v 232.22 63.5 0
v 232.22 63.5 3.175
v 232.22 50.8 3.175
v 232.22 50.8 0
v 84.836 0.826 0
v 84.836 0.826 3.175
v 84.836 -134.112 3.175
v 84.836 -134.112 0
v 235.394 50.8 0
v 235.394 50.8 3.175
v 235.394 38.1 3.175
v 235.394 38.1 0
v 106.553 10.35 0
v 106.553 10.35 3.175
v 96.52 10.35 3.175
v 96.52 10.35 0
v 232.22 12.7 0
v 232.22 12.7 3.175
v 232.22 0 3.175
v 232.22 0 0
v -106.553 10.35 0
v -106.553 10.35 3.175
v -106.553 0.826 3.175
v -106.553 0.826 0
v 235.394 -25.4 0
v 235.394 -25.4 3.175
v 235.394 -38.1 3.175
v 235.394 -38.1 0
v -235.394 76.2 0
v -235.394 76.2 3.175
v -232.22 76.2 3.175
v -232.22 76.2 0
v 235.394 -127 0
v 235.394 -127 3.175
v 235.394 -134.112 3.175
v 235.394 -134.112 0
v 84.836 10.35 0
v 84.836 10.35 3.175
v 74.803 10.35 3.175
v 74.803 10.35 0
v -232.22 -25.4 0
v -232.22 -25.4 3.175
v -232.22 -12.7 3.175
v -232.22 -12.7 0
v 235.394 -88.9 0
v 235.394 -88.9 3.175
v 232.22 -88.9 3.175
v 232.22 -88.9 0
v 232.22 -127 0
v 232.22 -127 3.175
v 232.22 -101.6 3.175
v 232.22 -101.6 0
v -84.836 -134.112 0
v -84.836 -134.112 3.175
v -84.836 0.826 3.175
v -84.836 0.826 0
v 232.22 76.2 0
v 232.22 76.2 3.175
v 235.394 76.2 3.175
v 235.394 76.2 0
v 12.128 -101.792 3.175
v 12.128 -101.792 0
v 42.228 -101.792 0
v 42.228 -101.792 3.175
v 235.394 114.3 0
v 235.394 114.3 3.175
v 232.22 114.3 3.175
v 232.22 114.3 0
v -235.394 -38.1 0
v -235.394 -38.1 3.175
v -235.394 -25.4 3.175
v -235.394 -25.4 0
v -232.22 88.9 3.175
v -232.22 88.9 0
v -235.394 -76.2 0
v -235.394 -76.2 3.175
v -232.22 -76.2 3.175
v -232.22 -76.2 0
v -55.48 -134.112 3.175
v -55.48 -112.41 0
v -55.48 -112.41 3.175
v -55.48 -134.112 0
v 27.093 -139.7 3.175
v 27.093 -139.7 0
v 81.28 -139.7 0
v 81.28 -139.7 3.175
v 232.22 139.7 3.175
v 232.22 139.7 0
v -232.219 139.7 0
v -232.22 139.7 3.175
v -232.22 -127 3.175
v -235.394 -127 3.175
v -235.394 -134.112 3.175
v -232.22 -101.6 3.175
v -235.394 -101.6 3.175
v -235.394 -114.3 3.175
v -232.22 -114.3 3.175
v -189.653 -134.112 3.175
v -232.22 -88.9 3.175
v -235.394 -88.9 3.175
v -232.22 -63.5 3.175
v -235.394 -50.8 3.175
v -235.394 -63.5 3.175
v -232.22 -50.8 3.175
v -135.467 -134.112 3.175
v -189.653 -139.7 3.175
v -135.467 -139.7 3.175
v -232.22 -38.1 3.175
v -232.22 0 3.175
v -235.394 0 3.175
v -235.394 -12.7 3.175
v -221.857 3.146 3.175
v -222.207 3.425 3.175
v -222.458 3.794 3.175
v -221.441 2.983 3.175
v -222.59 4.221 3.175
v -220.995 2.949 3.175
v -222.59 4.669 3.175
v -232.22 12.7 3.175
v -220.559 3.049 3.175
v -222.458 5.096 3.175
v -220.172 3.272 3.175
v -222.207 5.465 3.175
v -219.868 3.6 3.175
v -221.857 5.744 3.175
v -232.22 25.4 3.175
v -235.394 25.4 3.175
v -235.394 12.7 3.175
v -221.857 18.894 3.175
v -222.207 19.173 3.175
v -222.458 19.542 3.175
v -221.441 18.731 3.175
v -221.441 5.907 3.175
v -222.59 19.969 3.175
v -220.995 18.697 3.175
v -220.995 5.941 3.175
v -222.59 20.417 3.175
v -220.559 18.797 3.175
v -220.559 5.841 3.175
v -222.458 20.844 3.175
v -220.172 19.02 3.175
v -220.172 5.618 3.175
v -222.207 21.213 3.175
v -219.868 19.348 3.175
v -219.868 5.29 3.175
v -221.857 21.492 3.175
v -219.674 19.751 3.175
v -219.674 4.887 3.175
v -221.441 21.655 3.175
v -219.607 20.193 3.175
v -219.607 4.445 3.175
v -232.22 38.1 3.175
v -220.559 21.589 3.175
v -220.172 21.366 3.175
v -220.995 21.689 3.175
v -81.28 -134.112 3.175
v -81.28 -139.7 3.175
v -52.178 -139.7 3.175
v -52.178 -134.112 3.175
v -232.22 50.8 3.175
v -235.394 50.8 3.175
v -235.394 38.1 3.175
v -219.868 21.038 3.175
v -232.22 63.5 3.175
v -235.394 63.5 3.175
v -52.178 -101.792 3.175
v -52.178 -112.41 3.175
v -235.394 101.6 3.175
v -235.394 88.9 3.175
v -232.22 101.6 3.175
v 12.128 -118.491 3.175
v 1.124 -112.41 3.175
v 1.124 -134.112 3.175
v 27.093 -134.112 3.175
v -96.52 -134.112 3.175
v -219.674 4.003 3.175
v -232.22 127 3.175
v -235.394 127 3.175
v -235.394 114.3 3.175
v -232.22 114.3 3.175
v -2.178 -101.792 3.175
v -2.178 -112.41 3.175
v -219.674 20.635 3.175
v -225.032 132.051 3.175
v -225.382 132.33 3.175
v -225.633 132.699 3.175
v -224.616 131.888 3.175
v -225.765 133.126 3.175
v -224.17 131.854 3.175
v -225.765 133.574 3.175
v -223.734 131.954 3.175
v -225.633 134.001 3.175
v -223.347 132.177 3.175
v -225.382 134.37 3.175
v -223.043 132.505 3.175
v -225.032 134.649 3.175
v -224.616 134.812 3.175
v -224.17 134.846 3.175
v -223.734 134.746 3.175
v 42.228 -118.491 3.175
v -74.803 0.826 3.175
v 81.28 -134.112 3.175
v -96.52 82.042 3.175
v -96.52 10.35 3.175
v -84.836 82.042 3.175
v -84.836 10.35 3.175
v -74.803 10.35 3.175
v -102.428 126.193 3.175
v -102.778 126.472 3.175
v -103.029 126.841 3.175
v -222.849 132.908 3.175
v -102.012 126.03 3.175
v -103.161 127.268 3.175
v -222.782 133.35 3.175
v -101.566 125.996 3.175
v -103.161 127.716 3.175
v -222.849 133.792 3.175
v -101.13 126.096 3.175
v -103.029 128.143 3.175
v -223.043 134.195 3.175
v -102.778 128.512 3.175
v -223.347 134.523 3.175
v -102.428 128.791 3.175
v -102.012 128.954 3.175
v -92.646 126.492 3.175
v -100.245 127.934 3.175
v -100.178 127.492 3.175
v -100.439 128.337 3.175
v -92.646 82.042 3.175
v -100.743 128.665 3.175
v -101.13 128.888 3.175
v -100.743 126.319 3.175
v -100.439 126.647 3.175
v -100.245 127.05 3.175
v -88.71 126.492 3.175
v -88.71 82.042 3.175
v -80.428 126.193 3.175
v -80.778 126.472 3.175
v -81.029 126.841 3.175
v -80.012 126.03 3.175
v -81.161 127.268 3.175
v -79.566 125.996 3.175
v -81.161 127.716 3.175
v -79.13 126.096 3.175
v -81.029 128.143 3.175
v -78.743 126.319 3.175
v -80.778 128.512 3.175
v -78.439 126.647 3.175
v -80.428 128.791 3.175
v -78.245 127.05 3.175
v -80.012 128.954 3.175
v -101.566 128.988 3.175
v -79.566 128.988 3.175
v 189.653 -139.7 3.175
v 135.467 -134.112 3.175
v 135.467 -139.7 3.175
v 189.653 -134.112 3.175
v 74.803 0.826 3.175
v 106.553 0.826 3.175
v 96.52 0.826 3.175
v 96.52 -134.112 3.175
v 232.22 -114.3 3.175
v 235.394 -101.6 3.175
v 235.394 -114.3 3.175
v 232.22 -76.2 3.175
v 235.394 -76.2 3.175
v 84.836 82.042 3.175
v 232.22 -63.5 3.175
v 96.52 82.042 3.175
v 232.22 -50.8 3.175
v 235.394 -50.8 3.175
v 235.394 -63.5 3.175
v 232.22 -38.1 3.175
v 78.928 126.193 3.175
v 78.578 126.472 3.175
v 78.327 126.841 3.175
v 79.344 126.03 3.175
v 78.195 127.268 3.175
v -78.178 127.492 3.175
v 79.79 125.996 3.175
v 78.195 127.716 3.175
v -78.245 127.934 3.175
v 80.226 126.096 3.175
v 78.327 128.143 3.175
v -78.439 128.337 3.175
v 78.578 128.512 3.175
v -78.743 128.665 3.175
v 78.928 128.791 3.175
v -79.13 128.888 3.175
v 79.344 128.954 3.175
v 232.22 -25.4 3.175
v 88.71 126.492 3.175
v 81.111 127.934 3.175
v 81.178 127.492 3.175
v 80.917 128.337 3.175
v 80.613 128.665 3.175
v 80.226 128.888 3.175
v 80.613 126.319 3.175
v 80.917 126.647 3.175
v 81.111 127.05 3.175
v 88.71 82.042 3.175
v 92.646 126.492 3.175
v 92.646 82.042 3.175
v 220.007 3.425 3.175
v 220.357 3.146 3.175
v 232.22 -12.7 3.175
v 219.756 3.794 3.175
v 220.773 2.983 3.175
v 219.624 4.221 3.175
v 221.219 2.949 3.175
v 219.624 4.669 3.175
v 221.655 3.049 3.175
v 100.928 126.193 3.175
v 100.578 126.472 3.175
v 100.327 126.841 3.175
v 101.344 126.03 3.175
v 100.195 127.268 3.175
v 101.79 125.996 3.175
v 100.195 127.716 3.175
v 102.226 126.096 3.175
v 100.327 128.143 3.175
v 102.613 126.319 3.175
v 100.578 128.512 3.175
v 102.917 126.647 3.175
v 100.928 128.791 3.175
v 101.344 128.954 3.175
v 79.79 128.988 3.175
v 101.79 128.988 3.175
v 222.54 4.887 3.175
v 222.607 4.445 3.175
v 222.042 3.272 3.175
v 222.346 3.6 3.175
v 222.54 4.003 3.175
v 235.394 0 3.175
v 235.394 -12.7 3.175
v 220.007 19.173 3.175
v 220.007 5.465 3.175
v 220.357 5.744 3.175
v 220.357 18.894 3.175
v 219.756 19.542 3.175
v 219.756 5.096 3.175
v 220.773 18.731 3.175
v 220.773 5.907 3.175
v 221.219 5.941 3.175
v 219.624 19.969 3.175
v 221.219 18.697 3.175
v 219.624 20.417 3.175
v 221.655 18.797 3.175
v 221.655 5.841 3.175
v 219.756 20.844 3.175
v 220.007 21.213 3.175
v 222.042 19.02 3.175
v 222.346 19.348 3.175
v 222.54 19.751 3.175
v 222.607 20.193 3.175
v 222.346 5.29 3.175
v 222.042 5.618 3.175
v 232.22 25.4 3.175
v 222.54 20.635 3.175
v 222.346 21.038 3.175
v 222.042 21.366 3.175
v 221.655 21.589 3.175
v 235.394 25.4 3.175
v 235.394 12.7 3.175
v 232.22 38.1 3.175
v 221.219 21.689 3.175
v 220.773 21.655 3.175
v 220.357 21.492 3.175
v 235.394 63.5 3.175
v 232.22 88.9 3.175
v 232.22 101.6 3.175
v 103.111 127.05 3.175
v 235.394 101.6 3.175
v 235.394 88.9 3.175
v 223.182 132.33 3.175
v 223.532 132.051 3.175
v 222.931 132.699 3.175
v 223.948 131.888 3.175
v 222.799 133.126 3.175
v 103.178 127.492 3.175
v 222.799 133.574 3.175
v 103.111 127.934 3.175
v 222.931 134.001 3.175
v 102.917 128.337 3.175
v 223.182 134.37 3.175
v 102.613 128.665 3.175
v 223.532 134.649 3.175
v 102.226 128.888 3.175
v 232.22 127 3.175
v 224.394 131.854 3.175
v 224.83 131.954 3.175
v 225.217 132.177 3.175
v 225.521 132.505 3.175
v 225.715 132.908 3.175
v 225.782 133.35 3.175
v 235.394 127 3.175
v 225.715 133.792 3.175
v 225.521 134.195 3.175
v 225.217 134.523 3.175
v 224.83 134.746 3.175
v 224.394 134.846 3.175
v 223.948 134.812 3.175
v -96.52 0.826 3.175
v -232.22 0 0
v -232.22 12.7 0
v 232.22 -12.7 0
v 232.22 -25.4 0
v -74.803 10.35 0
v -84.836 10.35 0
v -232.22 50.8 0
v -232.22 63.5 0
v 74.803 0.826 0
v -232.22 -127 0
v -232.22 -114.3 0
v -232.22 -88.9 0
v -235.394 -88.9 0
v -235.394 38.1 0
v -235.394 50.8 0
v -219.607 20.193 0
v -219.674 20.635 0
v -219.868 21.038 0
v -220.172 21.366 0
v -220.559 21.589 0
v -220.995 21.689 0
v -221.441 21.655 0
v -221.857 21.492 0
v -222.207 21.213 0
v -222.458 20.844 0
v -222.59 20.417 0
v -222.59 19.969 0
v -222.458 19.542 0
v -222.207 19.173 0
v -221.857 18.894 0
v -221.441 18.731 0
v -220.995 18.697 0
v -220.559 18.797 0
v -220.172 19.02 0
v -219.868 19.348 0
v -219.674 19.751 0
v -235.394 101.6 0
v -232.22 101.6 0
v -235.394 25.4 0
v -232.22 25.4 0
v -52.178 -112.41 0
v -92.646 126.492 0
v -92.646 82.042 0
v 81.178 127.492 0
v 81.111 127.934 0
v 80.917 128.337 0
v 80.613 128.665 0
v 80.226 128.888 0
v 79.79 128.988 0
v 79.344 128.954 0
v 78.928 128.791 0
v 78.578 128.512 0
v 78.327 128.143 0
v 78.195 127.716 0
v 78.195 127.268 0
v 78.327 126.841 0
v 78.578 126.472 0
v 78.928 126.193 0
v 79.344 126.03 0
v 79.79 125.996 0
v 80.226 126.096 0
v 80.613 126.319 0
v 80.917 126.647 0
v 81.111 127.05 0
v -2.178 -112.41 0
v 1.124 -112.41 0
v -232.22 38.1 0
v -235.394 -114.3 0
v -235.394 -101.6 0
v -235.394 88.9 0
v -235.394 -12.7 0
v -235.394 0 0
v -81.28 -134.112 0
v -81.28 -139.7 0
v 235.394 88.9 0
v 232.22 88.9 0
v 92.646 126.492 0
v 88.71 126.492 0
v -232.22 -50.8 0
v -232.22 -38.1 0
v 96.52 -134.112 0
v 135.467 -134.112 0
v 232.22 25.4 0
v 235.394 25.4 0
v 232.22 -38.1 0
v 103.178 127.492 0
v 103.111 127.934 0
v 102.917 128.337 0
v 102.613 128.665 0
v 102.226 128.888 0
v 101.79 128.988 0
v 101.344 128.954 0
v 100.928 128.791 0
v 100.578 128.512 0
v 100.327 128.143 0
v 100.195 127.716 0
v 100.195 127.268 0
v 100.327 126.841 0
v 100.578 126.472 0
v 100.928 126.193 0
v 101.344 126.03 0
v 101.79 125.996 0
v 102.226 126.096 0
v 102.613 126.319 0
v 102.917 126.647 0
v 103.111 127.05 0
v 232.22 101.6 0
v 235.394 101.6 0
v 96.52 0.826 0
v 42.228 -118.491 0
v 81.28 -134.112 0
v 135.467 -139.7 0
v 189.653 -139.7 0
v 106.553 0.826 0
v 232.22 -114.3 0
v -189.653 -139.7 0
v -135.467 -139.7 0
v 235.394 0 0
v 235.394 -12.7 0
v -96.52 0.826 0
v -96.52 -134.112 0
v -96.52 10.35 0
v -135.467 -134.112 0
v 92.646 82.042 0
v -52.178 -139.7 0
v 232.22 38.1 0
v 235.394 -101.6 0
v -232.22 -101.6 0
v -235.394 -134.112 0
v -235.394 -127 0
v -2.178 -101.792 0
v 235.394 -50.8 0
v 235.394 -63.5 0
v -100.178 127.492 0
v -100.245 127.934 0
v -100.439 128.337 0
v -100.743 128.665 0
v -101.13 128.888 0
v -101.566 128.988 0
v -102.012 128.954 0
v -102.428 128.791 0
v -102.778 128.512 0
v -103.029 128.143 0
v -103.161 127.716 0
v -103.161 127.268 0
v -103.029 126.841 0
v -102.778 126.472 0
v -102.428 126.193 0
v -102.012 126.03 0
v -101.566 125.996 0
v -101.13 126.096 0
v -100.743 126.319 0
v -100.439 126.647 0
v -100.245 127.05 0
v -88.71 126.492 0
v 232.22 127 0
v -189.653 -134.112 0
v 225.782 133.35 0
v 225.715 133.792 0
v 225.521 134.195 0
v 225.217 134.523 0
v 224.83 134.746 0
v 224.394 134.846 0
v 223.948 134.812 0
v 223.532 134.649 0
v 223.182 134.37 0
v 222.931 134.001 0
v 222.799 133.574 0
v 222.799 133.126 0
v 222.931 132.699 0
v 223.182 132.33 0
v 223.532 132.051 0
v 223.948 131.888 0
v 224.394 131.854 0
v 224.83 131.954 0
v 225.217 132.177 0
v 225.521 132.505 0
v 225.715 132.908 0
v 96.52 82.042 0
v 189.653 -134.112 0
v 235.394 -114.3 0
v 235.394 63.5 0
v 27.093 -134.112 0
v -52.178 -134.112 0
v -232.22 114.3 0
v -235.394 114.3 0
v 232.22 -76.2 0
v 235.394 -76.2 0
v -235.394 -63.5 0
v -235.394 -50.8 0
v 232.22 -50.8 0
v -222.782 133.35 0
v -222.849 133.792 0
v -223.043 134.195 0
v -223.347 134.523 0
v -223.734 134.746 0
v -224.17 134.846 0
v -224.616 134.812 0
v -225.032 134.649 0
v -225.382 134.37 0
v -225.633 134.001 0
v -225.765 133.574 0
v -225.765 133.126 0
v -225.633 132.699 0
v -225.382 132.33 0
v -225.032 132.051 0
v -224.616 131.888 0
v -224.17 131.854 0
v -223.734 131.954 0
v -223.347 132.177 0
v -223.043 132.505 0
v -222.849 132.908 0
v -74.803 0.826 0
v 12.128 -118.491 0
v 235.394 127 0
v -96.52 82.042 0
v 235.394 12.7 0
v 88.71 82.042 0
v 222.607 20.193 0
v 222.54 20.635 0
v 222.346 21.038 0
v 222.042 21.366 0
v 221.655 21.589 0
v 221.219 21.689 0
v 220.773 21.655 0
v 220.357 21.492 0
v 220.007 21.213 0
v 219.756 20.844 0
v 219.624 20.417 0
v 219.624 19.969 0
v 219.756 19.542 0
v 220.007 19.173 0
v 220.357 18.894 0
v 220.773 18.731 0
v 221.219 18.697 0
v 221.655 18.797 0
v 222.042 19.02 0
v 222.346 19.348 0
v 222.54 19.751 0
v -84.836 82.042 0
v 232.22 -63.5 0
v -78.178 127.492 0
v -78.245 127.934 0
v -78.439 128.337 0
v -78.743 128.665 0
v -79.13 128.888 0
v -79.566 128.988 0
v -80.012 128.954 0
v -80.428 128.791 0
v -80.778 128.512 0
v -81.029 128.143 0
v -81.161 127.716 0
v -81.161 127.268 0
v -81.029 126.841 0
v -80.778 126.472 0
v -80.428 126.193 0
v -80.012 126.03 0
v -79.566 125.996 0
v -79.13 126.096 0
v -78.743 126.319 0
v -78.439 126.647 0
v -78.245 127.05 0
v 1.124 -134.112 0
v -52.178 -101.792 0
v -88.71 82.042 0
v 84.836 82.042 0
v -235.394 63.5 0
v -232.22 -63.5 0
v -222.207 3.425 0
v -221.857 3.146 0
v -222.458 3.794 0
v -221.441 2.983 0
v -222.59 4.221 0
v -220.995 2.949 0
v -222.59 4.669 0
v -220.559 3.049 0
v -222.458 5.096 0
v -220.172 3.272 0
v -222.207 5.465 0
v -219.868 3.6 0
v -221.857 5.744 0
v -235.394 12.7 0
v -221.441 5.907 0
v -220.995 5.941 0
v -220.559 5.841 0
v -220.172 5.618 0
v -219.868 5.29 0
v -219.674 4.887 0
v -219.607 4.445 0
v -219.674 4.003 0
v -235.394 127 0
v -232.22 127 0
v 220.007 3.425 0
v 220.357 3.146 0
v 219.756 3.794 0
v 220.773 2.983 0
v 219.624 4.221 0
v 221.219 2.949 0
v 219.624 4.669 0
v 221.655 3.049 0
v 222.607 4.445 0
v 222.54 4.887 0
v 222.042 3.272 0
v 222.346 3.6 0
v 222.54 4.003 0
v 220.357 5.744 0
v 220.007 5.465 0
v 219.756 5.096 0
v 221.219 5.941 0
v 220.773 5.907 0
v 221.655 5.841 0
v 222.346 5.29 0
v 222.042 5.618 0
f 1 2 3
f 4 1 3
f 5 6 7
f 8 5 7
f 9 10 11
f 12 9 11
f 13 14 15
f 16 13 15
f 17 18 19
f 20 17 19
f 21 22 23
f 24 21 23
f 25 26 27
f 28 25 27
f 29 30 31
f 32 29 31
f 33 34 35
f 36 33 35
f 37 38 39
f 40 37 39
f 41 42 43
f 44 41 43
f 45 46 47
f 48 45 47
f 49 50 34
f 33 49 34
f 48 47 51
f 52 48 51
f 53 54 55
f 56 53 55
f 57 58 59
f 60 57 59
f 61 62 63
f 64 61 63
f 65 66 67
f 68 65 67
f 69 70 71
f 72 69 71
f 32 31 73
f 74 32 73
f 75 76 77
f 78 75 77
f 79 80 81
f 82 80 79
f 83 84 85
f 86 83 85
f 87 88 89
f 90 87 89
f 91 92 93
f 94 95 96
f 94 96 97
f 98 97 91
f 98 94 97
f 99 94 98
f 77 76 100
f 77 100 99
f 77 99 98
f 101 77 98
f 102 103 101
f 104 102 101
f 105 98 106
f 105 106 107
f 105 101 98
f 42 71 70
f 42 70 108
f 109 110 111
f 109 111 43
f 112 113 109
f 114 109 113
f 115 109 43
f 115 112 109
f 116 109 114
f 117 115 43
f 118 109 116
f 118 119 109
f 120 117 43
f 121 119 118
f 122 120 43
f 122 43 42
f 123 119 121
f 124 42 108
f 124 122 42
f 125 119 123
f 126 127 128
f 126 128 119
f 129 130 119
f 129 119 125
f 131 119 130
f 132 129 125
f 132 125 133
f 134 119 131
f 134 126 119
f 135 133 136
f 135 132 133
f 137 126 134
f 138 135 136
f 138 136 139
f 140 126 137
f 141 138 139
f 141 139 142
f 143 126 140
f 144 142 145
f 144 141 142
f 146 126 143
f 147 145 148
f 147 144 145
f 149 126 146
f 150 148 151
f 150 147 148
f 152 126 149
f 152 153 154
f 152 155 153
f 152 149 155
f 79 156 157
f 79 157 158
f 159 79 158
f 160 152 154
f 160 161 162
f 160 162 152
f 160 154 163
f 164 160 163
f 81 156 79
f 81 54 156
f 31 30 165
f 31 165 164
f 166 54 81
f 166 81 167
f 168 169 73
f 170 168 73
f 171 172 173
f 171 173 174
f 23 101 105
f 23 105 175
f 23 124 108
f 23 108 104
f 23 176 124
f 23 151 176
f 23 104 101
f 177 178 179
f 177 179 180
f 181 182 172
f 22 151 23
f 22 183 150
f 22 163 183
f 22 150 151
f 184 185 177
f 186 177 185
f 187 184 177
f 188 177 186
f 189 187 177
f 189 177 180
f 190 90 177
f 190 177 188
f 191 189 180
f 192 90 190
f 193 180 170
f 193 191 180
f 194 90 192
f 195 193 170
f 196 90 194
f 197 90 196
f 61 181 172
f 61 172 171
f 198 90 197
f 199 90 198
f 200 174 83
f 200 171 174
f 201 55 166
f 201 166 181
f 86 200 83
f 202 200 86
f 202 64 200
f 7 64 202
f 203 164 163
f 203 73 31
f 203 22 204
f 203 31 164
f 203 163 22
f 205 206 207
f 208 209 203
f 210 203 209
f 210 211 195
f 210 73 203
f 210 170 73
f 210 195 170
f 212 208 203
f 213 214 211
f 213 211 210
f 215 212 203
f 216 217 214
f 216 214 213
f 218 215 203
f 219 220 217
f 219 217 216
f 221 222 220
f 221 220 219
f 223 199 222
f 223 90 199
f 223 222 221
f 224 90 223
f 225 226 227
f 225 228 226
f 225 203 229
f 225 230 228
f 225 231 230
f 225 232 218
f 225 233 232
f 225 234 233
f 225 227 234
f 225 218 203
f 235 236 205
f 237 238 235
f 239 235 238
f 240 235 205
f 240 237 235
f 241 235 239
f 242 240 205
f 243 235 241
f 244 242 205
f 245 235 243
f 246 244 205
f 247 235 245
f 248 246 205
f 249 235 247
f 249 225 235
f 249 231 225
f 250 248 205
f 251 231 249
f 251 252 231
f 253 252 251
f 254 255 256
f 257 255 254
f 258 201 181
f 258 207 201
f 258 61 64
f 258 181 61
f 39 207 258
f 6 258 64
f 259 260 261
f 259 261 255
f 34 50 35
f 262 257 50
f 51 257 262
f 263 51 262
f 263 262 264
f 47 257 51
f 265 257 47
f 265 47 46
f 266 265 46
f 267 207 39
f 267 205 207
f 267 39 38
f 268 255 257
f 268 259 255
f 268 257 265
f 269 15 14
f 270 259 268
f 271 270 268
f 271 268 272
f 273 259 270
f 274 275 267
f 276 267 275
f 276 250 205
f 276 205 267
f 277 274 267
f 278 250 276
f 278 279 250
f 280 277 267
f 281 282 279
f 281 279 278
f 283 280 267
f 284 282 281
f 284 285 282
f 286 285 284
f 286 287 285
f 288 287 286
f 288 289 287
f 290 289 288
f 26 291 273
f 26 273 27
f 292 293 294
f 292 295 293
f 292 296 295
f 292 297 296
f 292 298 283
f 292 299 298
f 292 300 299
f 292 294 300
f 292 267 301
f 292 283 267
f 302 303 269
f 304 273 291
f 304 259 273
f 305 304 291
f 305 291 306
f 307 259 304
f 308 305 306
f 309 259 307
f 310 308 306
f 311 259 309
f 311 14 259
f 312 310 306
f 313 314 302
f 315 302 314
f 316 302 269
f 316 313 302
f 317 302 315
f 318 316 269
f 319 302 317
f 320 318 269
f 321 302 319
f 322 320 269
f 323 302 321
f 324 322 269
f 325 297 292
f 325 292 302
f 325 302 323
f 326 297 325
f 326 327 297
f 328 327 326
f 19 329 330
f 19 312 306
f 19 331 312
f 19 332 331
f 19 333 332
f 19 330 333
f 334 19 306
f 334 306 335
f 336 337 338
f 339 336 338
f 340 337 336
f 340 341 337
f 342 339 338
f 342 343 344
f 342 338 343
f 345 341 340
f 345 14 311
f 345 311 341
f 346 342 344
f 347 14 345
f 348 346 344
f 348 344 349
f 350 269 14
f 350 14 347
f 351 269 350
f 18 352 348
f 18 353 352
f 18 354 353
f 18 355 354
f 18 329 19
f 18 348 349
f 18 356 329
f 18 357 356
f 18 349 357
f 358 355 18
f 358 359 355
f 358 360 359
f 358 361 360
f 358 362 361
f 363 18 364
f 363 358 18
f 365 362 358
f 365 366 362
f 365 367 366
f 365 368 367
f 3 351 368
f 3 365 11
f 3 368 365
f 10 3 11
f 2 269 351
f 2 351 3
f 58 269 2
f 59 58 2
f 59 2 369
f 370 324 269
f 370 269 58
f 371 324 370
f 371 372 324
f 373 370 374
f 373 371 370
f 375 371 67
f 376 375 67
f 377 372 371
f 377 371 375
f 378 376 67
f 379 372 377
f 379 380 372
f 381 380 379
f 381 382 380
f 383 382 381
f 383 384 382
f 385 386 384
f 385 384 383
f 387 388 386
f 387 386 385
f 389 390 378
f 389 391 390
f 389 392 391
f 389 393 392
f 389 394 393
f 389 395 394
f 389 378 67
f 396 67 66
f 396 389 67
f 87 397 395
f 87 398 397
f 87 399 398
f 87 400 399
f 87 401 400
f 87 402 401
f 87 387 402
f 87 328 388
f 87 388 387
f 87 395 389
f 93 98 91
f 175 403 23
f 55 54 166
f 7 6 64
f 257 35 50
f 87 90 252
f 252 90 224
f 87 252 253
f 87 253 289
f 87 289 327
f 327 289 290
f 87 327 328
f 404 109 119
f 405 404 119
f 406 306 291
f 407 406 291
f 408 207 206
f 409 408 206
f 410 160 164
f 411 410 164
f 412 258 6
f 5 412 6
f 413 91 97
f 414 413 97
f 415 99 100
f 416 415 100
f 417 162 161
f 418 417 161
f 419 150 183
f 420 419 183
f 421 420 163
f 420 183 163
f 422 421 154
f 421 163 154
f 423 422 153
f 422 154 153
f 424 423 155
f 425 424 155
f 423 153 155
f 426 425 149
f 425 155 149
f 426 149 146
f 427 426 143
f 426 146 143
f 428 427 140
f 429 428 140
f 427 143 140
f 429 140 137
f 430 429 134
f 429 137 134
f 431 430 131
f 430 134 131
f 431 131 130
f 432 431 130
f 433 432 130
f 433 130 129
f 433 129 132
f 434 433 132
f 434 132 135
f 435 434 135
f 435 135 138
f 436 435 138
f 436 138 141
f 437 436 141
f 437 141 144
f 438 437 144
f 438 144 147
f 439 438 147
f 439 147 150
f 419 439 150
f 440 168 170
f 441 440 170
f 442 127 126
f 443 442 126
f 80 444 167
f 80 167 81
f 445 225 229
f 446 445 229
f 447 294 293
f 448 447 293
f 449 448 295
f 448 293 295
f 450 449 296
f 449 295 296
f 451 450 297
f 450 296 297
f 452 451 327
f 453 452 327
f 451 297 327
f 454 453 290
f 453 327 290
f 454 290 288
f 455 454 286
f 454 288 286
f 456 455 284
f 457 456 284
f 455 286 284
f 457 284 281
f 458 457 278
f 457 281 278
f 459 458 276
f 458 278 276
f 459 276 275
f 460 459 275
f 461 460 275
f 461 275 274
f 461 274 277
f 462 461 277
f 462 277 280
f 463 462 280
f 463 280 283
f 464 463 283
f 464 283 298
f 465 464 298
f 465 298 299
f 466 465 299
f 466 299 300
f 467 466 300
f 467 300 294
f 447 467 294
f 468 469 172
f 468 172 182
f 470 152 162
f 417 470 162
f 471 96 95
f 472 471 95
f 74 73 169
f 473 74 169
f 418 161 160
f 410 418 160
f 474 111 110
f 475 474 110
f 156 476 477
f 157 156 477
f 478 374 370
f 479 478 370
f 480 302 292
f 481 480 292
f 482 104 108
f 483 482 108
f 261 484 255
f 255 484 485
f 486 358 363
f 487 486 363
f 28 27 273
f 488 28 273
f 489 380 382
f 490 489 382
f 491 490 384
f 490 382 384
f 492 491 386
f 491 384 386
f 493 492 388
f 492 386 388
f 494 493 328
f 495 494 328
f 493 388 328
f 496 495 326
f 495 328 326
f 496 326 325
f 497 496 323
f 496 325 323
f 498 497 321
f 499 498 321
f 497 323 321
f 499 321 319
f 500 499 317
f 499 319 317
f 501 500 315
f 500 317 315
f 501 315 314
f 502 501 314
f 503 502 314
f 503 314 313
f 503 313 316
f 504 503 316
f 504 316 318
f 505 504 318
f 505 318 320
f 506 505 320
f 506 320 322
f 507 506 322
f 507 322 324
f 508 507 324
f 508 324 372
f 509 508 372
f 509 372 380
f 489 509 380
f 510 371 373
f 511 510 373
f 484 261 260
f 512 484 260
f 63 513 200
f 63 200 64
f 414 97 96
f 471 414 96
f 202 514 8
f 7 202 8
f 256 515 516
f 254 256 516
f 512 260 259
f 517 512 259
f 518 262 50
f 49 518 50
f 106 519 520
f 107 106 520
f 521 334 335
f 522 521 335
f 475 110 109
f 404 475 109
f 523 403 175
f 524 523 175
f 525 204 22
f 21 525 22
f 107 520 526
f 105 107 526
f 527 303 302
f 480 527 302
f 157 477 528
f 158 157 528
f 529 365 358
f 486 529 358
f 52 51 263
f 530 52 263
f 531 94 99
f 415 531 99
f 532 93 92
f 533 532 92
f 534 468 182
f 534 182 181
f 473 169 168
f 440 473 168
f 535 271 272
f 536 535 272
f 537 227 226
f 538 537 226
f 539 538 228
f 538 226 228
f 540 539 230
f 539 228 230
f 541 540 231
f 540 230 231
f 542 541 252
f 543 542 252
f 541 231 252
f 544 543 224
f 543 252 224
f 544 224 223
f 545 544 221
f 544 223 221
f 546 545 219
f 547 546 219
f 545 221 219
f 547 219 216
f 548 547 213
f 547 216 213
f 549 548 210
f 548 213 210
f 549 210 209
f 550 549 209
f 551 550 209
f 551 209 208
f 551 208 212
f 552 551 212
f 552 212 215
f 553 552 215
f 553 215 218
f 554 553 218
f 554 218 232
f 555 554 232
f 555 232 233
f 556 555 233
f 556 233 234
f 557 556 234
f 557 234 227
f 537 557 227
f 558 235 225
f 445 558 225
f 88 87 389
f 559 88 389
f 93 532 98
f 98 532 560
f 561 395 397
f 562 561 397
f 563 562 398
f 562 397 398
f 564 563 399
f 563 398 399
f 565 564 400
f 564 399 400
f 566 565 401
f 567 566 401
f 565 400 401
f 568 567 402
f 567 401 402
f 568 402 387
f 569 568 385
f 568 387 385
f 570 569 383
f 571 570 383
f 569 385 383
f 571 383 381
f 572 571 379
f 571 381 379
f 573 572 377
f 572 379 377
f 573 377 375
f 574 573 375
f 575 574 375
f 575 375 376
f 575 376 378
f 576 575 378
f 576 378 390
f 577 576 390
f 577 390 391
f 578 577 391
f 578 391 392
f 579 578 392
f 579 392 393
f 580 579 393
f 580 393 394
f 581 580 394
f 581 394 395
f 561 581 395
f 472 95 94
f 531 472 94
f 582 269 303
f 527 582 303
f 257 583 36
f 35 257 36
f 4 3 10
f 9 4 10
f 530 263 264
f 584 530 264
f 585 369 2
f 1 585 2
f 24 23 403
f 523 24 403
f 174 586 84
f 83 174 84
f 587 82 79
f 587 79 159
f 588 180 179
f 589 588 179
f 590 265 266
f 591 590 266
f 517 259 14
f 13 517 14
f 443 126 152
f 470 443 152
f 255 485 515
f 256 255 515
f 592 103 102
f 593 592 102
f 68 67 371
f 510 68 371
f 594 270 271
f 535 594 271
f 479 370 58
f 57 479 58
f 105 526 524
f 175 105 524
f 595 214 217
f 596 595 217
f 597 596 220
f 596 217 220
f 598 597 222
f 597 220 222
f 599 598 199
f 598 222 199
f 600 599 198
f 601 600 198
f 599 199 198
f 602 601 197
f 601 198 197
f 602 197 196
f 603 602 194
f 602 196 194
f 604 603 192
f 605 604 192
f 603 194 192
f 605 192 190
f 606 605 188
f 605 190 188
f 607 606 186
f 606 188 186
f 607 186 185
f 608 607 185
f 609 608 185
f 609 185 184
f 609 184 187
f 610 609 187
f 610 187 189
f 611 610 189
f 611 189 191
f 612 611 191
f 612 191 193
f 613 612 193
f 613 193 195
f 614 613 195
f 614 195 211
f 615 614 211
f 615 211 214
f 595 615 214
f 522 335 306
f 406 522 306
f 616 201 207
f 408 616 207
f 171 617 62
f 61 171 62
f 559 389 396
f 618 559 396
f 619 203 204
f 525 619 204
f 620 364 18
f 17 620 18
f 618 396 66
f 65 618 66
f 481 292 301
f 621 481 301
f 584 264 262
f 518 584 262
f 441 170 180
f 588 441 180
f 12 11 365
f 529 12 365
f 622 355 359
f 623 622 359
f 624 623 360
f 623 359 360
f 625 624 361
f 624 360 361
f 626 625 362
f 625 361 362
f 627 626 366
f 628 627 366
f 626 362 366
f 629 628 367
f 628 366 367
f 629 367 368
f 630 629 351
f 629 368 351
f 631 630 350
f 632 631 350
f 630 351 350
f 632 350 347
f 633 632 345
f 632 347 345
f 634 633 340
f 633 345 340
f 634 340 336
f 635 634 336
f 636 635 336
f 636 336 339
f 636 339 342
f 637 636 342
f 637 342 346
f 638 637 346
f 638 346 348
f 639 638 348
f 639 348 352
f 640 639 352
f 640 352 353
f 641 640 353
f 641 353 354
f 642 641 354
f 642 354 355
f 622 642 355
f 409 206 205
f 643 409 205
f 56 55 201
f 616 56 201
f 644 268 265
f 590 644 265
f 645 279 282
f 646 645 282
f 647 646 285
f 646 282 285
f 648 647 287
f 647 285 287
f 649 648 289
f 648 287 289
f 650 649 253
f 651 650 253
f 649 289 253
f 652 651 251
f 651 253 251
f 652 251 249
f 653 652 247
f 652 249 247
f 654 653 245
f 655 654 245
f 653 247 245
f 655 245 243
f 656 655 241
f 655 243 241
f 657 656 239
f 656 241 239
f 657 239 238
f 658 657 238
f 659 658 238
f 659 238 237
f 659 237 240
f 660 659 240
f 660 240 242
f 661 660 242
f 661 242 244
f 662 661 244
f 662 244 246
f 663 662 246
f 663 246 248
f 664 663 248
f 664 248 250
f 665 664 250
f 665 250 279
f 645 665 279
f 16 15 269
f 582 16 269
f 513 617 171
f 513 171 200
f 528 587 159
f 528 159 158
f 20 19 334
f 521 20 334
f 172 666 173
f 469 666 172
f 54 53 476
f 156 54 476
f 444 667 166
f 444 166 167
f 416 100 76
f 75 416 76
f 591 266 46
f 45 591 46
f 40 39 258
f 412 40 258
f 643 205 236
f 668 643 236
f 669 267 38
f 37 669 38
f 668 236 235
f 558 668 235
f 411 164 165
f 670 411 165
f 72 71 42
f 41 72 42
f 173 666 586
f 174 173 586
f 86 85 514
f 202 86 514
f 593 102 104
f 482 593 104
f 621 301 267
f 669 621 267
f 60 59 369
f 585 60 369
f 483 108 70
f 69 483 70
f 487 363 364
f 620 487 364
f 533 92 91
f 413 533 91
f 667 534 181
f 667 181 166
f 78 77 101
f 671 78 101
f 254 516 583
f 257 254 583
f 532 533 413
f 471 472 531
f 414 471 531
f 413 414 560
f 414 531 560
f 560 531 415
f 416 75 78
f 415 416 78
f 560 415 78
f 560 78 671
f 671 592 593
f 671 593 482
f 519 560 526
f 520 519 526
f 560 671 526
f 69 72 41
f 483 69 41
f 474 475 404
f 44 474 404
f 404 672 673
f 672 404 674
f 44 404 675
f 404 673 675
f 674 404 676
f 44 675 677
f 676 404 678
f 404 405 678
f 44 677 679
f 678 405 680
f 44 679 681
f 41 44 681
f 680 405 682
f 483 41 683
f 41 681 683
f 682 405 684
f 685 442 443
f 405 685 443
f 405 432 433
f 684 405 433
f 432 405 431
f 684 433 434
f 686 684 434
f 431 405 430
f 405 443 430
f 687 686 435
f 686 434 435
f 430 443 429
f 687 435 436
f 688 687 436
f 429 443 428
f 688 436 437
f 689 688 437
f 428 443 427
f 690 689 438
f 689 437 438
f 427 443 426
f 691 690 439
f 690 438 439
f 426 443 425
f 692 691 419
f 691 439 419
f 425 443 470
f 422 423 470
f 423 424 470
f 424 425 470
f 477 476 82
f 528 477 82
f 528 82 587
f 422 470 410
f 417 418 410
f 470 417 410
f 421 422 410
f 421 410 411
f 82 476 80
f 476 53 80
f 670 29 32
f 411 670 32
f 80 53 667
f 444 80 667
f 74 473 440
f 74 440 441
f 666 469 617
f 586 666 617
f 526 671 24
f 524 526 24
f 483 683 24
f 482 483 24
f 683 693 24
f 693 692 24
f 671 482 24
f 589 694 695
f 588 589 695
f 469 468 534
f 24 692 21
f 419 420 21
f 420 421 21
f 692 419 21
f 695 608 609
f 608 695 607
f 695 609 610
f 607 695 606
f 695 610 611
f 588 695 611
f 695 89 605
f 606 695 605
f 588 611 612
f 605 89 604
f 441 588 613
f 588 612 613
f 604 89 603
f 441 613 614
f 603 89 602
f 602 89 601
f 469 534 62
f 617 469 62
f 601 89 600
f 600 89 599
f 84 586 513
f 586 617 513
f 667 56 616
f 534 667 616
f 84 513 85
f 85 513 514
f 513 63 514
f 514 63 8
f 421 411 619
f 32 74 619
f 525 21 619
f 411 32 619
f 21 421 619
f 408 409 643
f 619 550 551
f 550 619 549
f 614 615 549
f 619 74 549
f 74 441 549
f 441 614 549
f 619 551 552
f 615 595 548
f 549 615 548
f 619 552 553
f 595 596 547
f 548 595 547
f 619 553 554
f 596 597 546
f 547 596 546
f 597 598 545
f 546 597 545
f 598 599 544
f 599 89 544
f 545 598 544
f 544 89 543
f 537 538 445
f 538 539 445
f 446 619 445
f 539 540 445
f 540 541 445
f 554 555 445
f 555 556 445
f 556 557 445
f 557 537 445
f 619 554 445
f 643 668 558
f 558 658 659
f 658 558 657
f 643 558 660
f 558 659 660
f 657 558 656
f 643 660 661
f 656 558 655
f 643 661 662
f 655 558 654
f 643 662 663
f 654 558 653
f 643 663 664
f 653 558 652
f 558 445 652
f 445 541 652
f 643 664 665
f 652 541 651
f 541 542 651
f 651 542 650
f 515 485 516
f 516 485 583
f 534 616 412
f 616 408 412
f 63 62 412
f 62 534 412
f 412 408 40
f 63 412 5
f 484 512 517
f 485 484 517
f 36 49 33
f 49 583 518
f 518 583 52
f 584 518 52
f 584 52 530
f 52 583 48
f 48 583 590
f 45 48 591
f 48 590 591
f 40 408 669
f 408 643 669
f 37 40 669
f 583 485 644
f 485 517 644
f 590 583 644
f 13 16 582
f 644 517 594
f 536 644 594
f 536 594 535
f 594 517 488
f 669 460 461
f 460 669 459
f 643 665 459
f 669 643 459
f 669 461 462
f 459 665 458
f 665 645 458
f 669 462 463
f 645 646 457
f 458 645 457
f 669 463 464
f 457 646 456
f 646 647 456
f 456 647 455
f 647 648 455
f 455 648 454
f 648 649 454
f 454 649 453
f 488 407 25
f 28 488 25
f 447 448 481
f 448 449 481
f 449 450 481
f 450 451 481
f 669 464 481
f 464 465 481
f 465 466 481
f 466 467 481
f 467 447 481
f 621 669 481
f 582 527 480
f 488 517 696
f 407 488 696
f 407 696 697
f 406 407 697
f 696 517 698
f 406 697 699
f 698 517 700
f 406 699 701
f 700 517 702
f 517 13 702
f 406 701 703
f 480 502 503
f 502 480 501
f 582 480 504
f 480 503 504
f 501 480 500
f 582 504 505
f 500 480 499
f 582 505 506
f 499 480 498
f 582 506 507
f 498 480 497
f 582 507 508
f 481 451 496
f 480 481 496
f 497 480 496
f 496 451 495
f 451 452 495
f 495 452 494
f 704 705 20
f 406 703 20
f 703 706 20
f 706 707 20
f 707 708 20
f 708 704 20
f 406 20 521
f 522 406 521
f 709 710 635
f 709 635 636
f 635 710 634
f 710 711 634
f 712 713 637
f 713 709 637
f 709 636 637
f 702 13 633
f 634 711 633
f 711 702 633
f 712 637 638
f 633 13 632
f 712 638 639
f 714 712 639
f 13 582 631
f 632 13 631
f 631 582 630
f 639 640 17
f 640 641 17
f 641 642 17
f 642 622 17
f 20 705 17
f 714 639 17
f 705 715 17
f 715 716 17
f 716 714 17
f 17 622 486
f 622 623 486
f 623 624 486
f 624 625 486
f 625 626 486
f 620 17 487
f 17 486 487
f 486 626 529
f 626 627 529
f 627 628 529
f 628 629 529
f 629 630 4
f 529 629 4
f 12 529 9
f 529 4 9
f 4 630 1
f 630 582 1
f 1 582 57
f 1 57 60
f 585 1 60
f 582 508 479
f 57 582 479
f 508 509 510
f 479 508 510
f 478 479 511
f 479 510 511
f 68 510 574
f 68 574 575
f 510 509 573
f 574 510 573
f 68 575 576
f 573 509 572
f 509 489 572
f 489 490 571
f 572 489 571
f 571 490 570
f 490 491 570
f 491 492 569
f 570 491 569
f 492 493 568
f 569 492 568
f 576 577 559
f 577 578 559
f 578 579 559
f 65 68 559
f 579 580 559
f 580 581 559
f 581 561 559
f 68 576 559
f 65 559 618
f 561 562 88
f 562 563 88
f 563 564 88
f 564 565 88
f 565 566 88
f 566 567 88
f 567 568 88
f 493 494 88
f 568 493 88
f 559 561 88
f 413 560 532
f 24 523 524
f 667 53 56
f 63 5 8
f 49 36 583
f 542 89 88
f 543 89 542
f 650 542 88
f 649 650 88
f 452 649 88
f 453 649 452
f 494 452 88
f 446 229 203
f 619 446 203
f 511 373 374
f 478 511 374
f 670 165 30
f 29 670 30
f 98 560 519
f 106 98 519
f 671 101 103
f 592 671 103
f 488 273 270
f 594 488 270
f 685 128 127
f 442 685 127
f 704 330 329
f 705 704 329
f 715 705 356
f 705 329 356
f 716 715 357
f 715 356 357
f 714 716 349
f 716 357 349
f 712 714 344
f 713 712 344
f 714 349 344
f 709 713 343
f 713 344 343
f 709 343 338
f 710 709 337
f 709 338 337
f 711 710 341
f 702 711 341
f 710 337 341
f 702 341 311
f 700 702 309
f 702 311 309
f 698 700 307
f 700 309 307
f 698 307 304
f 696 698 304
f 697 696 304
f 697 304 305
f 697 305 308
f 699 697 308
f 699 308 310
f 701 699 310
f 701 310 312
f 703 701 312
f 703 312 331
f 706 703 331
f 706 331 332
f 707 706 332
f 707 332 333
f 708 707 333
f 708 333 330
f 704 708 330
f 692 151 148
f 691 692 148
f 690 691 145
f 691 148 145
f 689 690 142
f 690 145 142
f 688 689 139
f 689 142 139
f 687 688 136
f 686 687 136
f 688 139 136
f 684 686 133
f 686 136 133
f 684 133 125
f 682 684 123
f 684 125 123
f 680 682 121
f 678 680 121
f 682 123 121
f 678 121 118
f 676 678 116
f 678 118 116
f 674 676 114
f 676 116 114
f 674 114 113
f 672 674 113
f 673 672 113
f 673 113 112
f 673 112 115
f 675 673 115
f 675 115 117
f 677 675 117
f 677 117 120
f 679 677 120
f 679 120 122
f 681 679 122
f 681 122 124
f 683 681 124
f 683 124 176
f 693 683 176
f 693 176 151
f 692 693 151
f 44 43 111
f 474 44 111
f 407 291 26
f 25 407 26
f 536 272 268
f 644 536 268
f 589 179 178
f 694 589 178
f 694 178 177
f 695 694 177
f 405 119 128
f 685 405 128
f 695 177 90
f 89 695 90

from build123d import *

# Parameters (mm, degrees)
SKETCH1_W                    = 3.175
SKETCH1_H                    = 12.7
MAIN_EXTRUDE_DEPTH           = 3.175
SKETCH8_R                    = 1.5
SKETCH8_W                    = 3.175
SKETCH8_H                    = 31.877
MOUNT_HOLES_DEPTH            = 430.752406189
DOOR_SLOTS_DEPTH             = 430.752406189
SKETCH4_W                    = 30.099999998
SKETCH4_H                    = 16.699
TROUGH_AND_LEVER_HOLES_DEPTH = 430.752406189
SKETCH10_R                   = 1.5
DOOR_GUIDE_MOUNT_HOLES_DEPTH = 430.752406189
SKETCH12_R                   = 1.5
EXTENSION_CLIP_HOLES_DEPTH   = 430.752406189
EXTENSION_CENTER_CUT_DEPTH   = 430.752406189


with BuildPart() as part:
    # Sketch1 → Main Extrude (new body)
    with BuildSketch(Plane.XY):
        Polygon((-381, 139.7), (-406.4, 139.7), (-406.4, -139.7), (-352.213333333, -139.7), (-352.213333333, -134.112), (-298.026666667, -134.112), (-298.026666667, -139.7), (-243.84, -139.7), (-243.84, -134.112), (-189.653333333, -134.112), (-189.653333333, -139.7), (-135.466666667, -139.7), (-135.466666667, -134.112), (-81.28, -134.112), (-81.28, -139.7), (-27.093333333, -139.7), (-27.093333333, -134.112), (27.093333333, -134.112), (27.093333333, -139.7), (81.28, -139.7), (81.28, -134.112), (135.466666667, -134.112), (135.466666667, -139.7), (189.653333333, -139.7), (189.653333333, -134.112), (243.84, -134.112), (243.84, -139.7), (298.026666667, -139.7), (298.026666667, -134.112), (352.213333333, -134.112), (352.213333333, -139.7), (406.4, -139.7), (406.4, 139.7), (381, 139.7), (381, 127), (377.825, 127), (377.825, 139.7), (-377.825, 139.7), (-377.825, 127), (-381, 127), align=None)
        with Locations((-379.4125, 107.95)):
            Rectangle(SKETCH1_W, SKETCH1_H, mode=Mode.SUBTRACT)
        with Locations((-379.4125, 82.55)):
            Rectangle(SKETCH1_W, SKETCH1_H, mode=Mode.SUBTRACT)
        with Locations((-379.4125, 57.15)):
            Rectangle(SKETCH1_W, SKETCH1_H, mode=Mode.SUBTRACT)
        with Locations((-379.4125, 31.75)):
            Rectangle(SKETCH1_W, SKETCH1_H, mode=Mode.SUBTRACT)
        with Locations((-379.4125, 6.35)):
            Rectangle(SKETCH1_W, SKETCH1_H, mode=Mode.SUBTRACT)
        with Locations((-379.4125, -19.05)):
            Rectangle(SKETCH1_W, SKETCH1_H, mode=Mode.SUBTRACT)
        with Locations((-379.4125, -44.45)):
            Rectangle(SKETCH1_W, SKETCH1_H, mode=Mode.SUBTRACT)
        with Locations((-379.4125, -69.85)):
            Rectangle(SKETCH1_W, SKETCH1_H, mode=Mode.SUBTRACT)
        with Locations((-379.4125, -95.25)):
            Rectangle(SKETCH1_W, SKETCH1_H, mode=Mode.SUBTRACT)
        with Locations((-379.4125, -120.65)):
            Rectangle(SKETCH1_W, SKETCH1_H, mode=Mode.SUBTRACT)
        with Locations((379.4125, 107.95)):
            Rectangle(SKETCH1_W, SKETCH1_H, mode=Mode.SUBTRACT)
        with Locations((379.4125, 82.55)):
            Rectangle(SKETCH1_W, SKETCH1_H, mode=Mode.SUBTRACT)
        with Locations((379.4125, 57.15)):
            Rectangle(SKETCH1_W, SKETCH1_H, mode=Mode.SUBTRACT)
        with Locations((379.4125, 31.75)):
            Rectangle(SKETCH1_W, SKETCH1_H, mode=Mode.SUBTRACT)
        with Locations((379.4125, 6.35)):
            Rectangle(SKETCH1_W, SKETCH1_H, mode=Mode.SUBTRACT)
        with Locations((379.4125, -19.05)):
            Rectangle(SKETCH1_W, SKETCH1_H, mode=Mode.SUBTRACT)
        with Locations((379.4125, -44.45)):
            Rectangle(SKETCH1_W, SKETCH1_H, mode=Mode.SUBTRACT)
        with Locations((379.4125, -69.85)):
            Rectangle(SKETCH1_W, SKETCH1_H, mode=Mode.SUBTRACT)
        with Locations((379.4125, -95.25)):
            Rectangle(SKETCH1_W, SKETCH1_H, mode=Mode.SUBTRACT)
        with Locations((379.4125, -120.65)):
            Rectangle(SKETCH1_W, SKETCH1_H, mode=Mode.SUBTRACT)
    extrude(amount=MAIN_EXTRUDE_DEPTH)

    # Sketch8 → Mount Holes (cut, through all)
    with BuildSketch(Plane.XY.offset(3.175)):
        with Locations((-393.7, -120.65)):
            Circle(SKETCH8_R)
        with Locations((393.7, -120.65)):
            Circle(SKETCH8_R)
        with Locations((-382.5875, 12.319)):
            Rectangle(SKETCH8_W, SKETCH8_H)
        with Locations((382.5875, 12.319)):
            Rectangle(SKETCH8_W, SKETCH8_H)
    extrude(amount=-MOUNT_HOLES_DEPTH, mode=Mode.SUBTRACT)

    # Sketch3 → Door Slots (cut, through all)
    with BuildSketch(Plane.XY.offset(3.175)):
        Polygon((-88.7095, 126.492), (-92.6465, 126.492), (-92.6465, 82.042), (-96.52, 82.042), (-96.52, 10.3505), (-106.553, 10.3505), (-106.553, 0.8255), (-96.52, 0.8255), (-96.52, -134.112), (-84.836, -134.112), (-84.836, 0.8255), (-74.803, 0.8255), (-74.803, 10.3505), (-84.836, 10.3505), (-84.836, 82.042), (-88.7095, 82.042), align=None)
        Polygon((92.6465, 126.492), (88.7095, 126.492), (88.7095, 82.042), (84.836, 82.042), (84.836, 10.3505), (74.803, 10.3505), (74.803, 0.8255), (84.836, 0.8255), (84.836, -134.112), (96.52, -134.112), (96.52, 0.8255), (106.553, 0.8255), (106.553, 10.3505), (96.52, 10.3505), (96.52, 82.042), (92.6465, 82.042), align=None)
    extrude(amount=-DOOR_SLOTS_DEPTH, mode=Mode.SUBTRACT)

    # Sketch4 → Trough and Lever Holes (cut, through all)
    with BuildSketch(Plane.XY):
        Polygon((-52.178, -112.40999997), (-55.48, -112.40999997), (-55.48, -134.112), (-52.178, -134.112), (-52.178, -139.7), (-2.178, -139.7), (-2.178, -134.112), (1.124, -134.112), (1.124, -112.40999997), (-2.178, -112.40999997), (-2.178, -101.792), (-52.178, -101.792), align=None)
        with Locations((27.178, -110.1415)):
            Rectangle(SKETCH4_W, SKETCH4_H)
    extrude(amount=TROUGH_AND_LEVER_HOLES_DEPTH, mode=Mode.SUBTRACT)

    # Sketch10 → Door Guide Mount Holes (cut, through all)
    with BuildSketch(Plane.XY.offset(3.175)):
        with Locations((-101.678, 127.492)):
            Circle(SKETCH10_R)
        with Locations((-79.678, 127.492)):
            Circle(SKETCH10_R)
        with Locations((79.678, 127.492)):
            Circle(SKETCH10_R)
        with Locations((101.678, 127.492)):
            Circle(SKETCH10_R)
    extrude(amount=-DOOR_GUIDE_MOUNT_HOLES_DEPTH, mode=Mode.SUBTRACT)

    # Sketch12 → Extension Clip Holes (cut, through all)
    with BuildSketch(Plane.XY.offset(3.175)):
        with Locations((-246.507, 20.193)):
            Circle(SKETCH12_R)
        with Locations((-246.507, 4.445)):
            Circle(SKETCH12_R)
        with Locations((-221.107, 4.445)):
            Circle(SKETCH12_R)
        with Locations((-221.107, 20.193)):
            Circle(SKETCH12_R)
        with Locations((-243.332, 133.35)):
            Circle(SKETCH12_R)
        with Locations((-224.282, 133.35)):
            Circle(SKETCH12_R)
        with Locations((224.282, 133.35)):
            Circle(SKETCH12_R)
        with Locations((243.332, 133.35)):
            Circle(SKETCH12_R)
        with Locations((221.107, 20.193)):
            Circle(SKETCH12_R)
        with Locations((221.107, 4.445)):
            Circle(SKETCH12_R)
        with Locations((246.507, 4.445)):
            Circle(SKETCH12_R)
        with Locations((246.507, 20.193)):
            Circle(SKETCH12_R)
    extrude(amount=-EXTENSION_CLIP_HOLES_DEPTH, mode=Mode.SUBTRACT)

    # Sketch11<3> → Extension Center Cut (cut, through all)
    with BuildSketch(Plane.XY.offset(3.175)):
        Polygon((-232.2195, 127), (-232.2195, 139.7), (-406.4, 139.7), (-406.4, -139.7), (-235.3945, -139.7), (-235.3945, -127), (-232.2195, -127), (-232.2195, -114.3), (-235.3945, -114.3), (-235.3945, -101.6), (-232.2195, -101.6), (-232.2195, -88.9), (-235.3945, -88.9), (-235.3945, -76.2), (-232.2195, -76.2), (-232.2195, -63.5), (-235.3945, -63.5), (-235.3945, -50.8), (-232.2195, -50.8), (-232.2195, -38.1), (-235.3945, -38.1), (-235.3945, -25.4), (-232.2195, -25.4), (-232.2195, -12.7), (-235.3945, -12.7), (-235.3945, 0), (-232.2195, 0), (-232.2195, 12.7), (-235.3945, 12.7), (-235.3945, 25.4), (-232.2195, 25.4), (-232.2195, 38.1), (-235.3945, 38.1), (-235.3945, 50.8), (-232.2195, 50.8), (-232.2195, 63.5), (-235.3945, 63.5), (-235.3945, 76.2), (-232.2195, 76.2), (-232.2195, 88.9), (-235.3945, 88.9), (-235.3945, 101.6), (-232.2195, 101.6), (-232.2195, 114.3), (-235.3945, 114.3), (-235.3945, 127), align=None)
        Polygon((406.4, 139.7), (232.2195, 139.7), (232.2195, 127), (235.3945, 127), (235.3945, 114.3), (232.2195, 114.3), (232.2195, 101.6), (235.3945, 101.6), (235.3945, 88.9), (232.2195, 88.9), (232.2195, 76.2), (235.3945, 76.2), (235.3945, 63.5), (232.2195, 63.5), (232.2195, 50.8), (235.3945, 50.8), (235.3945, 38.1), (232.2195, 38.1), (232.2195, 25.4), (235.3945, 25.4), (235.3945, 12.7), (232.2195, 12.7), (232.2195, 0), (235.3945, 0), (235.3945, -12.7), (232.2195, -12.7), (232.2195, -25.4), (235.3945, -25.4), (235.3945, -38.1), (232.2195, -38.1), (232.2195, -50.8), (235.3945, -50.8), (235.3945, -63.5), (232.2195, -63.5), (232.2195, -76.2), (235.3945, -76.2), (235.3945, -88.9), (232.2195, -88.9), (232.2195, -101.6), (235.3945, -101.6), (235.3945, -114.3), (232.2195, -114.3), (232.2195, -127), (235.3945, -127), (235.3945, -139.7), (406.4, -139.7), align=None)
    extrude(amount=-EXTENSION_CENTER_CUT_DEPTH, mode=Mode.SUBTRACT)


solid = part.part
